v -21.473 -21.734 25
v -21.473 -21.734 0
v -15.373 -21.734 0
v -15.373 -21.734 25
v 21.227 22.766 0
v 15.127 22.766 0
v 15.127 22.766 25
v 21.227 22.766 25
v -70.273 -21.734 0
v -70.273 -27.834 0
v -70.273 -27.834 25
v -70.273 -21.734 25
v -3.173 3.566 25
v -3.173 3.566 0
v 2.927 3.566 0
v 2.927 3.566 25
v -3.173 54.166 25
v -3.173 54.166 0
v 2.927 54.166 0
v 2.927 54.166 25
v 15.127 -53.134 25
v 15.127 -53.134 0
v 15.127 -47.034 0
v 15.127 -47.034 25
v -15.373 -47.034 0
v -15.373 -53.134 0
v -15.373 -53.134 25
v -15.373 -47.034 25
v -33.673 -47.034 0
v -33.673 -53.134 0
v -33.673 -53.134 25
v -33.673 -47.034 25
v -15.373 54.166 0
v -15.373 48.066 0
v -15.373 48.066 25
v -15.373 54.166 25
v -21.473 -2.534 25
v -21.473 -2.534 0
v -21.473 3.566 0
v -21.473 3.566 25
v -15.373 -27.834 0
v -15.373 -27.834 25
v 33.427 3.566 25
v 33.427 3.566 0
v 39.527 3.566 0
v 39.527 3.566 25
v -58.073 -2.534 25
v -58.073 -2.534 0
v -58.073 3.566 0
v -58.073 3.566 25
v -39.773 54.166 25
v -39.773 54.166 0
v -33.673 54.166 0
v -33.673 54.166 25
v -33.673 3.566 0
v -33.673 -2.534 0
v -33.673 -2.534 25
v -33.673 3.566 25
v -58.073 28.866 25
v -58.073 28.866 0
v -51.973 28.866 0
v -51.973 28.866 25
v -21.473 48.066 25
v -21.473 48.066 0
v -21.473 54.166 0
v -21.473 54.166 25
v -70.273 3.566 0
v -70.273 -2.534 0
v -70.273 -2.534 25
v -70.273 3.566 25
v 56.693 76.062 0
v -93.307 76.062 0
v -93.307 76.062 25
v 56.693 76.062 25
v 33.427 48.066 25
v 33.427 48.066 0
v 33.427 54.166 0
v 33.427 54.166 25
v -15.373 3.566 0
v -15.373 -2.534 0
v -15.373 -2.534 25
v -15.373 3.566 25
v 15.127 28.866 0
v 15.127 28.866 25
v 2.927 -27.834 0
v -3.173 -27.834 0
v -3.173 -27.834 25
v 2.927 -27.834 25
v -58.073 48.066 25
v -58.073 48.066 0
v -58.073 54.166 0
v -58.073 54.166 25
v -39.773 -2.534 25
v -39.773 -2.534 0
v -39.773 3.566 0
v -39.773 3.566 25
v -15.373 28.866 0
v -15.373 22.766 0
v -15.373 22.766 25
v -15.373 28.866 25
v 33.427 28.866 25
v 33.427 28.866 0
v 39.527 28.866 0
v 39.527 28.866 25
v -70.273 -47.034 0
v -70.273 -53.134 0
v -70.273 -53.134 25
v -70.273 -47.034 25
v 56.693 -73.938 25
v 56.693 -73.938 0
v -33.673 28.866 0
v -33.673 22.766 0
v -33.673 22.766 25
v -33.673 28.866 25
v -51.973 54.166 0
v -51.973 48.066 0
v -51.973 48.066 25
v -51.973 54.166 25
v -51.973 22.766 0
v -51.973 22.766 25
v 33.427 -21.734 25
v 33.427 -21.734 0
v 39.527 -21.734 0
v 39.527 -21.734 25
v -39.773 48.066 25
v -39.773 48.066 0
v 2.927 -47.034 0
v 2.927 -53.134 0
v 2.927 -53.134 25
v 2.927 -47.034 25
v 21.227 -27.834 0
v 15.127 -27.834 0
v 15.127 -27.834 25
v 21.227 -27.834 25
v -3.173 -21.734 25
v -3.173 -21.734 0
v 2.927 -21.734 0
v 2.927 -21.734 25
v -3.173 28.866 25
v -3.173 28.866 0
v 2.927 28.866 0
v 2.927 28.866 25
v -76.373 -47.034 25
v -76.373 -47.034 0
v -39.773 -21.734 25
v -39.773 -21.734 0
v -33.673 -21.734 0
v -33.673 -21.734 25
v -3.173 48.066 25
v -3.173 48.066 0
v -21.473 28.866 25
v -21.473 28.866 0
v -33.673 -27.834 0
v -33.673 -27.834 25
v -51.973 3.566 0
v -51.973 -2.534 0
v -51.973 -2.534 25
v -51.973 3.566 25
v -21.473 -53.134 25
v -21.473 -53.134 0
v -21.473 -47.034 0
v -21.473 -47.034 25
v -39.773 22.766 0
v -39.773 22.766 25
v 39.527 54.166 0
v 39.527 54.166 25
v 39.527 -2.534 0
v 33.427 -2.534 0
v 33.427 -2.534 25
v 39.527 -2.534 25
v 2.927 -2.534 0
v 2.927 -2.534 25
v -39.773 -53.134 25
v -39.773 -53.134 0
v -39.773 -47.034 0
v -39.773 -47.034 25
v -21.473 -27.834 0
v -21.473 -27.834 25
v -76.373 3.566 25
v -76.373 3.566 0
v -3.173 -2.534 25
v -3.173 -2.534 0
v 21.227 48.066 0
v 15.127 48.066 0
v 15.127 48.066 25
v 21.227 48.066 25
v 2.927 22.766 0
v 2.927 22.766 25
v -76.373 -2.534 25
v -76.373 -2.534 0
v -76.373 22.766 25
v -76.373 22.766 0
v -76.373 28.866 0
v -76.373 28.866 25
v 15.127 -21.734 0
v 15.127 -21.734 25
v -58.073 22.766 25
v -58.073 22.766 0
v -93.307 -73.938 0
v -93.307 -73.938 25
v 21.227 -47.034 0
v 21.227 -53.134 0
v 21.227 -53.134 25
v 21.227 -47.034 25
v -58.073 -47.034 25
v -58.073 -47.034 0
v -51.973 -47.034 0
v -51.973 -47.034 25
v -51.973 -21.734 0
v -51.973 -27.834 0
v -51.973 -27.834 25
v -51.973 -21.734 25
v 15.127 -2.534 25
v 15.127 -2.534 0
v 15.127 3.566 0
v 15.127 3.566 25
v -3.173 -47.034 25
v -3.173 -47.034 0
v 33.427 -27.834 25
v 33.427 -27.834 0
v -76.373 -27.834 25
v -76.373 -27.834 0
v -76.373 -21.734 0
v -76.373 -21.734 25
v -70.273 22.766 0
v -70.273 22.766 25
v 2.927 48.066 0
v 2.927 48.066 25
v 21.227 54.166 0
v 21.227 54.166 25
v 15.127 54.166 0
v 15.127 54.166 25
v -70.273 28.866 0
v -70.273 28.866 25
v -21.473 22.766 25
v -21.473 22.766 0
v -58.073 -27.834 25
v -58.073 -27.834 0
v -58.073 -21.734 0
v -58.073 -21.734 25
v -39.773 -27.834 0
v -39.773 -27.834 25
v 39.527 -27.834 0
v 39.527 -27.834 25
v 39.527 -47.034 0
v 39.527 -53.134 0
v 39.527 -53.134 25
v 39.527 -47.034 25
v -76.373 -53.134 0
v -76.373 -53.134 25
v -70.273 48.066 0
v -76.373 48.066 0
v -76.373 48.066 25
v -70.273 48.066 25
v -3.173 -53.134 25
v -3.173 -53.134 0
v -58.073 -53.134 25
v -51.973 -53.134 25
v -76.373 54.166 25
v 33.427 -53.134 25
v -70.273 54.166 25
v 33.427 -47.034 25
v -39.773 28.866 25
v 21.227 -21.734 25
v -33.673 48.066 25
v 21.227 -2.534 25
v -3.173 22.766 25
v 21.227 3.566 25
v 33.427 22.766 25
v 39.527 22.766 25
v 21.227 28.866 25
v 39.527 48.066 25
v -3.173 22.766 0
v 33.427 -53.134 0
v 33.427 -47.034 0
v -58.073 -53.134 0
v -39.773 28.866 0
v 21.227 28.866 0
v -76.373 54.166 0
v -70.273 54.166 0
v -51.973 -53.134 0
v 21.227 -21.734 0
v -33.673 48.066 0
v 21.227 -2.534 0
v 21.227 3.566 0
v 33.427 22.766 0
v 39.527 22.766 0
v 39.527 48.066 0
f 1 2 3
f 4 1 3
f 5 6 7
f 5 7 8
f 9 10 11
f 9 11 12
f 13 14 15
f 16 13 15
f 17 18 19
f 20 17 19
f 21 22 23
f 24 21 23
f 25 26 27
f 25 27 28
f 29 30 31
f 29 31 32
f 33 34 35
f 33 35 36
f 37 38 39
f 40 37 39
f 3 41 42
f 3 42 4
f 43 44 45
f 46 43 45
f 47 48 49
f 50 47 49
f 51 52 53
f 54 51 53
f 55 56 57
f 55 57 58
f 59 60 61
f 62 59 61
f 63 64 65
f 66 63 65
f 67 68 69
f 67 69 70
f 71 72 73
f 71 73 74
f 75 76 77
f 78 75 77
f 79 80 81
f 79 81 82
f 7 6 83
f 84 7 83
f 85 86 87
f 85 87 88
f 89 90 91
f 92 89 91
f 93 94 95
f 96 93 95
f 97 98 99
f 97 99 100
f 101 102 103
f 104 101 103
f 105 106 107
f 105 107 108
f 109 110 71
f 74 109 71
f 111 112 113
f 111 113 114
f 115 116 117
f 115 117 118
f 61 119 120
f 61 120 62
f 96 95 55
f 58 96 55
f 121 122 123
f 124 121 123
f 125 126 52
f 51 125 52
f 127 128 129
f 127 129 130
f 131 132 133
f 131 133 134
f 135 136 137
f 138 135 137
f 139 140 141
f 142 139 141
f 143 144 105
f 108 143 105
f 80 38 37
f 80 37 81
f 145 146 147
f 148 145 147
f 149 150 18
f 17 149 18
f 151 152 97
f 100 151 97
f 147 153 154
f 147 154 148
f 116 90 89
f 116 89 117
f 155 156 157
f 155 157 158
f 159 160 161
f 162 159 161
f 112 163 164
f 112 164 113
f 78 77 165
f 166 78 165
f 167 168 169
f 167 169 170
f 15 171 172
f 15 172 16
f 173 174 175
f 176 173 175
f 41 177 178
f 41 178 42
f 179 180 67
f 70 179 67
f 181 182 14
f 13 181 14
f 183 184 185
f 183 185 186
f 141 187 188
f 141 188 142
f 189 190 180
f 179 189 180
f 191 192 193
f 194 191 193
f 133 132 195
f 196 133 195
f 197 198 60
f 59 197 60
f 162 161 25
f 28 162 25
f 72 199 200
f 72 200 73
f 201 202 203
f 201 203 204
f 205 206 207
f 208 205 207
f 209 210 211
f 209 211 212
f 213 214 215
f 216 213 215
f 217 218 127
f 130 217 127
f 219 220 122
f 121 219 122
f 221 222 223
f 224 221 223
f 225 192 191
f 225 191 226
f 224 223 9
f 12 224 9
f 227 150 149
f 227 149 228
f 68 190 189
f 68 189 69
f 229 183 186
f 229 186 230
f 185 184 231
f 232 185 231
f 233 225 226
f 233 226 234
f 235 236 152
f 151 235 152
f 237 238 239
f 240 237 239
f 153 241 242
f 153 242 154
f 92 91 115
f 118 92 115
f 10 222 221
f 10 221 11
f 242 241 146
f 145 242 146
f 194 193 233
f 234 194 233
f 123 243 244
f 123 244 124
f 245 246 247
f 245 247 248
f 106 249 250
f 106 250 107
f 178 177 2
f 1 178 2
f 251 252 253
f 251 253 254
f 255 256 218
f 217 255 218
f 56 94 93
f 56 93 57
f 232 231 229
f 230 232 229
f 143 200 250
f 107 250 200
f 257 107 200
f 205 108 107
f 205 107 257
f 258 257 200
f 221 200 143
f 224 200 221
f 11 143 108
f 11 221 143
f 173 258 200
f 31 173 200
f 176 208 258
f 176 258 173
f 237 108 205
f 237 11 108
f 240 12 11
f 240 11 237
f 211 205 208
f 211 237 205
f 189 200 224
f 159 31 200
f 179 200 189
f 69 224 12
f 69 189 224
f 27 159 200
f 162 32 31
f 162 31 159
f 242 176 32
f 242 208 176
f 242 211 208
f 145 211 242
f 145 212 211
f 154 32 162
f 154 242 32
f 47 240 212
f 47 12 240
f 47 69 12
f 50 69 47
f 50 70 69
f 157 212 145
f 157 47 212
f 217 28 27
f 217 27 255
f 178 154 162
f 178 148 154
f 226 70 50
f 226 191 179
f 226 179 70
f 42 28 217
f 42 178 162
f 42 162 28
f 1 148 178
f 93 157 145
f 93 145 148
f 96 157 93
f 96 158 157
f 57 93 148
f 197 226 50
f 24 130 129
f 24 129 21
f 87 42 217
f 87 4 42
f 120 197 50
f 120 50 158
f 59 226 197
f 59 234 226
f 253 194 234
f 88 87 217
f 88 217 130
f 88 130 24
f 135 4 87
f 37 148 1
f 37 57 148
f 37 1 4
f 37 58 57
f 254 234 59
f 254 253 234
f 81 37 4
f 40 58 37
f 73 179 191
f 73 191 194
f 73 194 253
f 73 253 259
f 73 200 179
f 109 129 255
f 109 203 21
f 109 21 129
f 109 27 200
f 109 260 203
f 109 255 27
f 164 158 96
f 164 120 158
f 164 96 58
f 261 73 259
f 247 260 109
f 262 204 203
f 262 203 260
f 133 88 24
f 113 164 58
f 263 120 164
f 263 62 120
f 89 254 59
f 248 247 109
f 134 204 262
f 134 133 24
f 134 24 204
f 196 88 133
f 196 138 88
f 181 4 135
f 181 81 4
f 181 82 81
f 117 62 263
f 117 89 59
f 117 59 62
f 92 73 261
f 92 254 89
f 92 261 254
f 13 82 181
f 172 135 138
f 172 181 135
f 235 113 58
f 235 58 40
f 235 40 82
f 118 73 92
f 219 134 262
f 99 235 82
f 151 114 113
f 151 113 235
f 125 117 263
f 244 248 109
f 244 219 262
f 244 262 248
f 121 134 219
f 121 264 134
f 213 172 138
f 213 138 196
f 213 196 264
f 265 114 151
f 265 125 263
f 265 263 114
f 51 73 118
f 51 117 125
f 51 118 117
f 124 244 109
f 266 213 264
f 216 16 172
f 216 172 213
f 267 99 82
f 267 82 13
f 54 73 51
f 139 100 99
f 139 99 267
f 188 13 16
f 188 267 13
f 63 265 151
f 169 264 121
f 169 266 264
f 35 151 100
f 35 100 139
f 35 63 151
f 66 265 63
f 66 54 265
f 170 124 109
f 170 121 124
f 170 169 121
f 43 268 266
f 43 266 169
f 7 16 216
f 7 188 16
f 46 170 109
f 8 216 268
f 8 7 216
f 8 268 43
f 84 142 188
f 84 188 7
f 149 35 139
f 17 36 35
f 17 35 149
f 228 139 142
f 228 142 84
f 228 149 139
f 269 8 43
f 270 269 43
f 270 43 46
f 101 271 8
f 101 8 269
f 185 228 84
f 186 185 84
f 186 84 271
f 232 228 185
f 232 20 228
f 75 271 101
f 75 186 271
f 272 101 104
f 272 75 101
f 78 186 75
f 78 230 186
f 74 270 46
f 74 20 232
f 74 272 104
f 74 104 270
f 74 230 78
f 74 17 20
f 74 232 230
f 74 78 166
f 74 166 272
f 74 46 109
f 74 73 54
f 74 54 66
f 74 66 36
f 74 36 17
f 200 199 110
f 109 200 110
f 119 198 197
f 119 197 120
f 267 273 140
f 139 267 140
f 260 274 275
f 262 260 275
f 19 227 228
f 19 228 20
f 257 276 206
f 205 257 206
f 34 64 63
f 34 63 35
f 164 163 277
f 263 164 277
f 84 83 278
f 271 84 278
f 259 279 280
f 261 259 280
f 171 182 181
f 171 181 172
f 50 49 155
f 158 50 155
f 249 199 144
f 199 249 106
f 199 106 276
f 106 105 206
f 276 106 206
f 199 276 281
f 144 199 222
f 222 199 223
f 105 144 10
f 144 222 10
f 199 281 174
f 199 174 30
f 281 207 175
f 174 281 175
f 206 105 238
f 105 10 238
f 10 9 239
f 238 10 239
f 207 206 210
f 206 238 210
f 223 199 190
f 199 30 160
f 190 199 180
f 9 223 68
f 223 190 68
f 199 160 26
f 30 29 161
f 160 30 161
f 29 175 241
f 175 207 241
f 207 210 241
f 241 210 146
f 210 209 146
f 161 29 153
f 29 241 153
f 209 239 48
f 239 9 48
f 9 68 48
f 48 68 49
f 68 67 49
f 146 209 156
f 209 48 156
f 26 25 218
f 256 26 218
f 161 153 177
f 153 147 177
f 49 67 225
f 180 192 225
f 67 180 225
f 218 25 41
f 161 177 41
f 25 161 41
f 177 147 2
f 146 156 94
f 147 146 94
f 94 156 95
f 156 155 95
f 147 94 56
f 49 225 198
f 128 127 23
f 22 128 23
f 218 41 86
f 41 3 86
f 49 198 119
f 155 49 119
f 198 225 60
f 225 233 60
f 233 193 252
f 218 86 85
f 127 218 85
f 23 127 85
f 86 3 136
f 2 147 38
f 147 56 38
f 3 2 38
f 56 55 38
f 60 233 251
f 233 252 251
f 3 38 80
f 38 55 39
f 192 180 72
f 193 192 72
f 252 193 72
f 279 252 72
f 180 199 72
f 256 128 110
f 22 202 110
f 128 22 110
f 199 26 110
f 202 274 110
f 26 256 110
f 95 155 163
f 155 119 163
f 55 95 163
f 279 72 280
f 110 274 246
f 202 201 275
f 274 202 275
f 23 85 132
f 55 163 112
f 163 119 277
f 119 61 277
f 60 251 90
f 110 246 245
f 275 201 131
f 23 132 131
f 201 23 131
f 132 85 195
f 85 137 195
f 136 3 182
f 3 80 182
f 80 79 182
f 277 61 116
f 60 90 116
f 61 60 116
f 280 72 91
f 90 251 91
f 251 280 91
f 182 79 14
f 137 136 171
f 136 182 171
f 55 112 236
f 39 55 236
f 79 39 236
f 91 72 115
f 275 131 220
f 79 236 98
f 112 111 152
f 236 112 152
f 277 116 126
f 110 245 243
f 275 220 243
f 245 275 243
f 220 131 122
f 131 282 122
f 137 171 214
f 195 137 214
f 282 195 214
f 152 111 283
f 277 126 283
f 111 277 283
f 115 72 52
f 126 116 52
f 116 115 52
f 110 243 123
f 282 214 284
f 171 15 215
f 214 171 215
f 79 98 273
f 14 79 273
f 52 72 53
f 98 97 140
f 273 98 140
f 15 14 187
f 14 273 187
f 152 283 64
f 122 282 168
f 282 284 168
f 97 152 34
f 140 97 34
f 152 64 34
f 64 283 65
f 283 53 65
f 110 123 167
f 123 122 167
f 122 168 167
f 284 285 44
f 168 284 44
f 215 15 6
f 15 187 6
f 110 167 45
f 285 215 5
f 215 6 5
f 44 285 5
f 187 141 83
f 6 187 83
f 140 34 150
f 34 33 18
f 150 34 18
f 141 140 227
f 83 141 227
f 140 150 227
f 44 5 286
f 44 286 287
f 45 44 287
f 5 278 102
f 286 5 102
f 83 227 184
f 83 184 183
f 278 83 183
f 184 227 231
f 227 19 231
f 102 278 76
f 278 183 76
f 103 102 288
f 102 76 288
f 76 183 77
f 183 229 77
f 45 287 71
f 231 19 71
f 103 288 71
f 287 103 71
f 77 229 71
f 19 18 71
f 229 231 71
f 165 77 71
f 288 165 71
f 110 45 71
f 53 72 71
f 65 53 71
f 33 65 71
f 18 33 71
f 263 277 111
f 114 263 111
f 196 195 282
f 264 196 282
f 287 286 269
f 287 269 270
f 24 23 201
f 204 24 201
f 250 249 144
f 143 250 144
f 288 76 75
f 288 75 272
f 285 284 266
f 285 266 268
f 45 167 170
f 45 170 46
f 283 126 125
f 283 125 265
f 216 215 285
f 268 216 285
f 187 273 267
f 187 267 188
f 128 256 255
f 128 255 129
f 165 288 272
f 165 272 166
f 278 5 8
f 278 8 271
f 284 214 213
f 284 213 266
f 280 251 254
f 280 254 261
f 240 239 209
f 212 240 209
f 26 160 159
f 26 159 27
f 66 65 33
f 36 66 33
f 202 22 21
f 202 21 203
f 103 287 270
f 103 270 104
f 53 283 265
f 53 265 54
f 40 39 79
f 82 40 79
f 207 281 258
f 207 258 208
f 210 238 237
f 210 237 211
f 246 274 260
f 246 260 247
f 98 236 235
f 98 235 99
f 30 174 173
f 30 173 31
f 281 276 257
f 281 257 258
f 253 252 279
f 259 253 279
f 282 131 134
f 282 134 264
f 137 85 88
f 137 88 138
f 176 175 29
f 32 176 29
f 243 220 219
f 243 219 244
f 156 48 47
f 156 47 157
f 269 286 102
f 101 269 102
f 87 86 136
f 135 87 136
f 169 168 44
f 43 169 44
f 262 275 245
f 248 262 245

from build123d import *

# Parameters (mm, degrees)
F0_W     = 150
F0_H     = 150
F0_W_2   = 6.1
F0_H_2   = 6.1
F1_DEPTH = 25


with BuildPart() as f1:
    # F0 (on Top) → F1 (new body)
    with BuildSketch(Plane.XY):
        with Locations((-18.306946, 1.062334)):
            Rectangle(F0_W, F0_H)
        with Locations((-73.323034, -50.083685)):
            Rectangle(F0_W_2, F0_H_2, mode=Mode.SUBTRACT)
        with Locations((-55.023034, -50.083685)):
            Rectangle(F0_W_2, F0_H_2, mode=Mode.SUBTRACT)
        with Locations((-36.723034, -50.083685)):
            Rectangle(F0_W_2, F0_H_2, mode=Mode.SUBTRACT)
        with Locations((-18.423034, -50.083685)):
            Rectangle(F0_W_2, F0_H_2, mode=Mode.SUBTRACT)
        with Locations((-73.323034, -24.783685)):
            Rectangle(F0_W_2, F0_H_2, mode=Mode.SUBTRACT)
        with Locations((-73.323034, 0.516315)):
            Rectangle(F0_W_2, F0_H_2, mode=Mode.SUBTRACT)
        with Locations((-55.023034, -24.783685)):
            Rectangle(F0_W_2, F0_H_2, mode=Mode.SUBTRACT)
        with Locations((-36.723034, -24.783685)):
            Rectangle(F0_W_2, F0_H_2, mode=Mode.SUBTRACT)
        with Locations((-18.423034, -24.783685)):
            Rectangle(F0_W_2, F0_H_2, mode=Mode.SUBTRACT)
        with Locations((-55.023034, 0.516315)):
            Rectangle(F0_W_2, F0_H_2, mode=Mode.SUBTRACT)
        with Locations((-36.723034, 0.516315)):
            Rectangle(F0_W_2, F0_H_2, mode=Mode.SUBTRACT)
        with Locations((-18.423034, 0.516315)):
            Rectangle(F0_W_2, F0_H_2, mode=Mode.SUBTRACT)
        with Locations((-0.123034, -50.083685)):
            Rectangle(F0_W_2, F0_H_2, mode=Mode.SUBTRACT)
        with Locations((18.176966, -50.083685)):
            Rectangle(F0_W_2, F0_H_2, mode=Mode.SUBTRACT)
        with Locations((36.476966, -50.083685)):
            Rectangle(F0_W_2, F0_H_2, mode=Mode.SUBTRACT)
        with Locations((-0.123034, -24.783685)):
            Rectangle(F0_W_2, F0_H_2, mode=Mode.SUBTRACT)
        with Locations((18.176966, -24.783685)):
            Rectangle(F0_W_2, F0_H_2, mode=Mode.SUBTRACT)
        with Locations((-0.123034, 0.516315)):
            Rectangle(F0_W_2, F0_H_2, mode=Mode.SUBTRACT)
        with Locations((18.176966, 0.516315)):
            Rectangle(F0_W_2, F0_H_2, mode=Mode.SUBTRACT)
        with Locations((36.476966, -24.783685)):
            Rectangle(F0_W_2, F0_H_2, mode=Mode.SUBTRACT)
        with Locations((36.476966, 0.516315)):
            Rectangle(F0_W_2, F0_H_2, mode=Mode.SUBTRACT)
        with Locations((-73.323034, 25.816315)):
            Rectangle(F0_W_2, F0_H_2, mode=Mode.SUBTRACT)
        with Locations((-55.023034, 25.816315)):
            Rectangle(F0_W_2, F0_H_2, mode=Mode.SUBTRACT)
        with Locations((-36.723034, 25.816315)):
            Rectangle(F0_W_2, F0_H_2, mode=Mode.SUBTRACT)
        with Locations((-18.423034, 25.816315)):
            Rectangle(F0_W_2, F0_H_2, mode=Mode.SUBTRACT)
        with Locations((-73.323034, 51.116315)):
            Rectangle(F0_W_2, F0_H_2, mode=Mode.SUBTRACT)
        with Locations((-55.023034, 51.116315)):
            Rectangle(F0_W_2, F0_H_2, mode=Mode.SUBTRACT)
        with Locations((-36.723034, 51.116315)):
            Rectangle(F0_W_2, F0_H_2, mode=Mode.SUBTRACT)
        with Locations((-18.423034, 51.116315)):
            Rectangle(F0_W_2, F0_H_2, mode=Mode.SUBTRACT)
        with Locations((-0.123034, 25.816315)):
            Rectangle(F0_W_2, F0_H_2, mode=Mode.SUBTRACT)
        with Locations((18.176966, 25.816315)):
            Rectangle(F0_W_2, F0_H_2, mode=Mode.SUBTRACT)
        with Locations((36.476966, 25.816315)):
            Rectangle(F0_W_2, F0_H_2, mode=Mode.SUBTRACT)
        with Locations((-0.123034, 51.116315)):
            Rectangle(F0_W_2, F0_H_2, mode=Mode.SUBTRACT)
        with Locations((18.176966, 51.116315)):
            Rectangle(F0_W_2, F0_H_2, mode=Mode.SUBTRACT)
        with Locations((36.476966, 51.116315)):
            Rectangle(F0_W_2, F0_H_2, mode=Mode.SUBTRACT)
    extrude(amount=F1_DEPTH)


solid = f1.part
